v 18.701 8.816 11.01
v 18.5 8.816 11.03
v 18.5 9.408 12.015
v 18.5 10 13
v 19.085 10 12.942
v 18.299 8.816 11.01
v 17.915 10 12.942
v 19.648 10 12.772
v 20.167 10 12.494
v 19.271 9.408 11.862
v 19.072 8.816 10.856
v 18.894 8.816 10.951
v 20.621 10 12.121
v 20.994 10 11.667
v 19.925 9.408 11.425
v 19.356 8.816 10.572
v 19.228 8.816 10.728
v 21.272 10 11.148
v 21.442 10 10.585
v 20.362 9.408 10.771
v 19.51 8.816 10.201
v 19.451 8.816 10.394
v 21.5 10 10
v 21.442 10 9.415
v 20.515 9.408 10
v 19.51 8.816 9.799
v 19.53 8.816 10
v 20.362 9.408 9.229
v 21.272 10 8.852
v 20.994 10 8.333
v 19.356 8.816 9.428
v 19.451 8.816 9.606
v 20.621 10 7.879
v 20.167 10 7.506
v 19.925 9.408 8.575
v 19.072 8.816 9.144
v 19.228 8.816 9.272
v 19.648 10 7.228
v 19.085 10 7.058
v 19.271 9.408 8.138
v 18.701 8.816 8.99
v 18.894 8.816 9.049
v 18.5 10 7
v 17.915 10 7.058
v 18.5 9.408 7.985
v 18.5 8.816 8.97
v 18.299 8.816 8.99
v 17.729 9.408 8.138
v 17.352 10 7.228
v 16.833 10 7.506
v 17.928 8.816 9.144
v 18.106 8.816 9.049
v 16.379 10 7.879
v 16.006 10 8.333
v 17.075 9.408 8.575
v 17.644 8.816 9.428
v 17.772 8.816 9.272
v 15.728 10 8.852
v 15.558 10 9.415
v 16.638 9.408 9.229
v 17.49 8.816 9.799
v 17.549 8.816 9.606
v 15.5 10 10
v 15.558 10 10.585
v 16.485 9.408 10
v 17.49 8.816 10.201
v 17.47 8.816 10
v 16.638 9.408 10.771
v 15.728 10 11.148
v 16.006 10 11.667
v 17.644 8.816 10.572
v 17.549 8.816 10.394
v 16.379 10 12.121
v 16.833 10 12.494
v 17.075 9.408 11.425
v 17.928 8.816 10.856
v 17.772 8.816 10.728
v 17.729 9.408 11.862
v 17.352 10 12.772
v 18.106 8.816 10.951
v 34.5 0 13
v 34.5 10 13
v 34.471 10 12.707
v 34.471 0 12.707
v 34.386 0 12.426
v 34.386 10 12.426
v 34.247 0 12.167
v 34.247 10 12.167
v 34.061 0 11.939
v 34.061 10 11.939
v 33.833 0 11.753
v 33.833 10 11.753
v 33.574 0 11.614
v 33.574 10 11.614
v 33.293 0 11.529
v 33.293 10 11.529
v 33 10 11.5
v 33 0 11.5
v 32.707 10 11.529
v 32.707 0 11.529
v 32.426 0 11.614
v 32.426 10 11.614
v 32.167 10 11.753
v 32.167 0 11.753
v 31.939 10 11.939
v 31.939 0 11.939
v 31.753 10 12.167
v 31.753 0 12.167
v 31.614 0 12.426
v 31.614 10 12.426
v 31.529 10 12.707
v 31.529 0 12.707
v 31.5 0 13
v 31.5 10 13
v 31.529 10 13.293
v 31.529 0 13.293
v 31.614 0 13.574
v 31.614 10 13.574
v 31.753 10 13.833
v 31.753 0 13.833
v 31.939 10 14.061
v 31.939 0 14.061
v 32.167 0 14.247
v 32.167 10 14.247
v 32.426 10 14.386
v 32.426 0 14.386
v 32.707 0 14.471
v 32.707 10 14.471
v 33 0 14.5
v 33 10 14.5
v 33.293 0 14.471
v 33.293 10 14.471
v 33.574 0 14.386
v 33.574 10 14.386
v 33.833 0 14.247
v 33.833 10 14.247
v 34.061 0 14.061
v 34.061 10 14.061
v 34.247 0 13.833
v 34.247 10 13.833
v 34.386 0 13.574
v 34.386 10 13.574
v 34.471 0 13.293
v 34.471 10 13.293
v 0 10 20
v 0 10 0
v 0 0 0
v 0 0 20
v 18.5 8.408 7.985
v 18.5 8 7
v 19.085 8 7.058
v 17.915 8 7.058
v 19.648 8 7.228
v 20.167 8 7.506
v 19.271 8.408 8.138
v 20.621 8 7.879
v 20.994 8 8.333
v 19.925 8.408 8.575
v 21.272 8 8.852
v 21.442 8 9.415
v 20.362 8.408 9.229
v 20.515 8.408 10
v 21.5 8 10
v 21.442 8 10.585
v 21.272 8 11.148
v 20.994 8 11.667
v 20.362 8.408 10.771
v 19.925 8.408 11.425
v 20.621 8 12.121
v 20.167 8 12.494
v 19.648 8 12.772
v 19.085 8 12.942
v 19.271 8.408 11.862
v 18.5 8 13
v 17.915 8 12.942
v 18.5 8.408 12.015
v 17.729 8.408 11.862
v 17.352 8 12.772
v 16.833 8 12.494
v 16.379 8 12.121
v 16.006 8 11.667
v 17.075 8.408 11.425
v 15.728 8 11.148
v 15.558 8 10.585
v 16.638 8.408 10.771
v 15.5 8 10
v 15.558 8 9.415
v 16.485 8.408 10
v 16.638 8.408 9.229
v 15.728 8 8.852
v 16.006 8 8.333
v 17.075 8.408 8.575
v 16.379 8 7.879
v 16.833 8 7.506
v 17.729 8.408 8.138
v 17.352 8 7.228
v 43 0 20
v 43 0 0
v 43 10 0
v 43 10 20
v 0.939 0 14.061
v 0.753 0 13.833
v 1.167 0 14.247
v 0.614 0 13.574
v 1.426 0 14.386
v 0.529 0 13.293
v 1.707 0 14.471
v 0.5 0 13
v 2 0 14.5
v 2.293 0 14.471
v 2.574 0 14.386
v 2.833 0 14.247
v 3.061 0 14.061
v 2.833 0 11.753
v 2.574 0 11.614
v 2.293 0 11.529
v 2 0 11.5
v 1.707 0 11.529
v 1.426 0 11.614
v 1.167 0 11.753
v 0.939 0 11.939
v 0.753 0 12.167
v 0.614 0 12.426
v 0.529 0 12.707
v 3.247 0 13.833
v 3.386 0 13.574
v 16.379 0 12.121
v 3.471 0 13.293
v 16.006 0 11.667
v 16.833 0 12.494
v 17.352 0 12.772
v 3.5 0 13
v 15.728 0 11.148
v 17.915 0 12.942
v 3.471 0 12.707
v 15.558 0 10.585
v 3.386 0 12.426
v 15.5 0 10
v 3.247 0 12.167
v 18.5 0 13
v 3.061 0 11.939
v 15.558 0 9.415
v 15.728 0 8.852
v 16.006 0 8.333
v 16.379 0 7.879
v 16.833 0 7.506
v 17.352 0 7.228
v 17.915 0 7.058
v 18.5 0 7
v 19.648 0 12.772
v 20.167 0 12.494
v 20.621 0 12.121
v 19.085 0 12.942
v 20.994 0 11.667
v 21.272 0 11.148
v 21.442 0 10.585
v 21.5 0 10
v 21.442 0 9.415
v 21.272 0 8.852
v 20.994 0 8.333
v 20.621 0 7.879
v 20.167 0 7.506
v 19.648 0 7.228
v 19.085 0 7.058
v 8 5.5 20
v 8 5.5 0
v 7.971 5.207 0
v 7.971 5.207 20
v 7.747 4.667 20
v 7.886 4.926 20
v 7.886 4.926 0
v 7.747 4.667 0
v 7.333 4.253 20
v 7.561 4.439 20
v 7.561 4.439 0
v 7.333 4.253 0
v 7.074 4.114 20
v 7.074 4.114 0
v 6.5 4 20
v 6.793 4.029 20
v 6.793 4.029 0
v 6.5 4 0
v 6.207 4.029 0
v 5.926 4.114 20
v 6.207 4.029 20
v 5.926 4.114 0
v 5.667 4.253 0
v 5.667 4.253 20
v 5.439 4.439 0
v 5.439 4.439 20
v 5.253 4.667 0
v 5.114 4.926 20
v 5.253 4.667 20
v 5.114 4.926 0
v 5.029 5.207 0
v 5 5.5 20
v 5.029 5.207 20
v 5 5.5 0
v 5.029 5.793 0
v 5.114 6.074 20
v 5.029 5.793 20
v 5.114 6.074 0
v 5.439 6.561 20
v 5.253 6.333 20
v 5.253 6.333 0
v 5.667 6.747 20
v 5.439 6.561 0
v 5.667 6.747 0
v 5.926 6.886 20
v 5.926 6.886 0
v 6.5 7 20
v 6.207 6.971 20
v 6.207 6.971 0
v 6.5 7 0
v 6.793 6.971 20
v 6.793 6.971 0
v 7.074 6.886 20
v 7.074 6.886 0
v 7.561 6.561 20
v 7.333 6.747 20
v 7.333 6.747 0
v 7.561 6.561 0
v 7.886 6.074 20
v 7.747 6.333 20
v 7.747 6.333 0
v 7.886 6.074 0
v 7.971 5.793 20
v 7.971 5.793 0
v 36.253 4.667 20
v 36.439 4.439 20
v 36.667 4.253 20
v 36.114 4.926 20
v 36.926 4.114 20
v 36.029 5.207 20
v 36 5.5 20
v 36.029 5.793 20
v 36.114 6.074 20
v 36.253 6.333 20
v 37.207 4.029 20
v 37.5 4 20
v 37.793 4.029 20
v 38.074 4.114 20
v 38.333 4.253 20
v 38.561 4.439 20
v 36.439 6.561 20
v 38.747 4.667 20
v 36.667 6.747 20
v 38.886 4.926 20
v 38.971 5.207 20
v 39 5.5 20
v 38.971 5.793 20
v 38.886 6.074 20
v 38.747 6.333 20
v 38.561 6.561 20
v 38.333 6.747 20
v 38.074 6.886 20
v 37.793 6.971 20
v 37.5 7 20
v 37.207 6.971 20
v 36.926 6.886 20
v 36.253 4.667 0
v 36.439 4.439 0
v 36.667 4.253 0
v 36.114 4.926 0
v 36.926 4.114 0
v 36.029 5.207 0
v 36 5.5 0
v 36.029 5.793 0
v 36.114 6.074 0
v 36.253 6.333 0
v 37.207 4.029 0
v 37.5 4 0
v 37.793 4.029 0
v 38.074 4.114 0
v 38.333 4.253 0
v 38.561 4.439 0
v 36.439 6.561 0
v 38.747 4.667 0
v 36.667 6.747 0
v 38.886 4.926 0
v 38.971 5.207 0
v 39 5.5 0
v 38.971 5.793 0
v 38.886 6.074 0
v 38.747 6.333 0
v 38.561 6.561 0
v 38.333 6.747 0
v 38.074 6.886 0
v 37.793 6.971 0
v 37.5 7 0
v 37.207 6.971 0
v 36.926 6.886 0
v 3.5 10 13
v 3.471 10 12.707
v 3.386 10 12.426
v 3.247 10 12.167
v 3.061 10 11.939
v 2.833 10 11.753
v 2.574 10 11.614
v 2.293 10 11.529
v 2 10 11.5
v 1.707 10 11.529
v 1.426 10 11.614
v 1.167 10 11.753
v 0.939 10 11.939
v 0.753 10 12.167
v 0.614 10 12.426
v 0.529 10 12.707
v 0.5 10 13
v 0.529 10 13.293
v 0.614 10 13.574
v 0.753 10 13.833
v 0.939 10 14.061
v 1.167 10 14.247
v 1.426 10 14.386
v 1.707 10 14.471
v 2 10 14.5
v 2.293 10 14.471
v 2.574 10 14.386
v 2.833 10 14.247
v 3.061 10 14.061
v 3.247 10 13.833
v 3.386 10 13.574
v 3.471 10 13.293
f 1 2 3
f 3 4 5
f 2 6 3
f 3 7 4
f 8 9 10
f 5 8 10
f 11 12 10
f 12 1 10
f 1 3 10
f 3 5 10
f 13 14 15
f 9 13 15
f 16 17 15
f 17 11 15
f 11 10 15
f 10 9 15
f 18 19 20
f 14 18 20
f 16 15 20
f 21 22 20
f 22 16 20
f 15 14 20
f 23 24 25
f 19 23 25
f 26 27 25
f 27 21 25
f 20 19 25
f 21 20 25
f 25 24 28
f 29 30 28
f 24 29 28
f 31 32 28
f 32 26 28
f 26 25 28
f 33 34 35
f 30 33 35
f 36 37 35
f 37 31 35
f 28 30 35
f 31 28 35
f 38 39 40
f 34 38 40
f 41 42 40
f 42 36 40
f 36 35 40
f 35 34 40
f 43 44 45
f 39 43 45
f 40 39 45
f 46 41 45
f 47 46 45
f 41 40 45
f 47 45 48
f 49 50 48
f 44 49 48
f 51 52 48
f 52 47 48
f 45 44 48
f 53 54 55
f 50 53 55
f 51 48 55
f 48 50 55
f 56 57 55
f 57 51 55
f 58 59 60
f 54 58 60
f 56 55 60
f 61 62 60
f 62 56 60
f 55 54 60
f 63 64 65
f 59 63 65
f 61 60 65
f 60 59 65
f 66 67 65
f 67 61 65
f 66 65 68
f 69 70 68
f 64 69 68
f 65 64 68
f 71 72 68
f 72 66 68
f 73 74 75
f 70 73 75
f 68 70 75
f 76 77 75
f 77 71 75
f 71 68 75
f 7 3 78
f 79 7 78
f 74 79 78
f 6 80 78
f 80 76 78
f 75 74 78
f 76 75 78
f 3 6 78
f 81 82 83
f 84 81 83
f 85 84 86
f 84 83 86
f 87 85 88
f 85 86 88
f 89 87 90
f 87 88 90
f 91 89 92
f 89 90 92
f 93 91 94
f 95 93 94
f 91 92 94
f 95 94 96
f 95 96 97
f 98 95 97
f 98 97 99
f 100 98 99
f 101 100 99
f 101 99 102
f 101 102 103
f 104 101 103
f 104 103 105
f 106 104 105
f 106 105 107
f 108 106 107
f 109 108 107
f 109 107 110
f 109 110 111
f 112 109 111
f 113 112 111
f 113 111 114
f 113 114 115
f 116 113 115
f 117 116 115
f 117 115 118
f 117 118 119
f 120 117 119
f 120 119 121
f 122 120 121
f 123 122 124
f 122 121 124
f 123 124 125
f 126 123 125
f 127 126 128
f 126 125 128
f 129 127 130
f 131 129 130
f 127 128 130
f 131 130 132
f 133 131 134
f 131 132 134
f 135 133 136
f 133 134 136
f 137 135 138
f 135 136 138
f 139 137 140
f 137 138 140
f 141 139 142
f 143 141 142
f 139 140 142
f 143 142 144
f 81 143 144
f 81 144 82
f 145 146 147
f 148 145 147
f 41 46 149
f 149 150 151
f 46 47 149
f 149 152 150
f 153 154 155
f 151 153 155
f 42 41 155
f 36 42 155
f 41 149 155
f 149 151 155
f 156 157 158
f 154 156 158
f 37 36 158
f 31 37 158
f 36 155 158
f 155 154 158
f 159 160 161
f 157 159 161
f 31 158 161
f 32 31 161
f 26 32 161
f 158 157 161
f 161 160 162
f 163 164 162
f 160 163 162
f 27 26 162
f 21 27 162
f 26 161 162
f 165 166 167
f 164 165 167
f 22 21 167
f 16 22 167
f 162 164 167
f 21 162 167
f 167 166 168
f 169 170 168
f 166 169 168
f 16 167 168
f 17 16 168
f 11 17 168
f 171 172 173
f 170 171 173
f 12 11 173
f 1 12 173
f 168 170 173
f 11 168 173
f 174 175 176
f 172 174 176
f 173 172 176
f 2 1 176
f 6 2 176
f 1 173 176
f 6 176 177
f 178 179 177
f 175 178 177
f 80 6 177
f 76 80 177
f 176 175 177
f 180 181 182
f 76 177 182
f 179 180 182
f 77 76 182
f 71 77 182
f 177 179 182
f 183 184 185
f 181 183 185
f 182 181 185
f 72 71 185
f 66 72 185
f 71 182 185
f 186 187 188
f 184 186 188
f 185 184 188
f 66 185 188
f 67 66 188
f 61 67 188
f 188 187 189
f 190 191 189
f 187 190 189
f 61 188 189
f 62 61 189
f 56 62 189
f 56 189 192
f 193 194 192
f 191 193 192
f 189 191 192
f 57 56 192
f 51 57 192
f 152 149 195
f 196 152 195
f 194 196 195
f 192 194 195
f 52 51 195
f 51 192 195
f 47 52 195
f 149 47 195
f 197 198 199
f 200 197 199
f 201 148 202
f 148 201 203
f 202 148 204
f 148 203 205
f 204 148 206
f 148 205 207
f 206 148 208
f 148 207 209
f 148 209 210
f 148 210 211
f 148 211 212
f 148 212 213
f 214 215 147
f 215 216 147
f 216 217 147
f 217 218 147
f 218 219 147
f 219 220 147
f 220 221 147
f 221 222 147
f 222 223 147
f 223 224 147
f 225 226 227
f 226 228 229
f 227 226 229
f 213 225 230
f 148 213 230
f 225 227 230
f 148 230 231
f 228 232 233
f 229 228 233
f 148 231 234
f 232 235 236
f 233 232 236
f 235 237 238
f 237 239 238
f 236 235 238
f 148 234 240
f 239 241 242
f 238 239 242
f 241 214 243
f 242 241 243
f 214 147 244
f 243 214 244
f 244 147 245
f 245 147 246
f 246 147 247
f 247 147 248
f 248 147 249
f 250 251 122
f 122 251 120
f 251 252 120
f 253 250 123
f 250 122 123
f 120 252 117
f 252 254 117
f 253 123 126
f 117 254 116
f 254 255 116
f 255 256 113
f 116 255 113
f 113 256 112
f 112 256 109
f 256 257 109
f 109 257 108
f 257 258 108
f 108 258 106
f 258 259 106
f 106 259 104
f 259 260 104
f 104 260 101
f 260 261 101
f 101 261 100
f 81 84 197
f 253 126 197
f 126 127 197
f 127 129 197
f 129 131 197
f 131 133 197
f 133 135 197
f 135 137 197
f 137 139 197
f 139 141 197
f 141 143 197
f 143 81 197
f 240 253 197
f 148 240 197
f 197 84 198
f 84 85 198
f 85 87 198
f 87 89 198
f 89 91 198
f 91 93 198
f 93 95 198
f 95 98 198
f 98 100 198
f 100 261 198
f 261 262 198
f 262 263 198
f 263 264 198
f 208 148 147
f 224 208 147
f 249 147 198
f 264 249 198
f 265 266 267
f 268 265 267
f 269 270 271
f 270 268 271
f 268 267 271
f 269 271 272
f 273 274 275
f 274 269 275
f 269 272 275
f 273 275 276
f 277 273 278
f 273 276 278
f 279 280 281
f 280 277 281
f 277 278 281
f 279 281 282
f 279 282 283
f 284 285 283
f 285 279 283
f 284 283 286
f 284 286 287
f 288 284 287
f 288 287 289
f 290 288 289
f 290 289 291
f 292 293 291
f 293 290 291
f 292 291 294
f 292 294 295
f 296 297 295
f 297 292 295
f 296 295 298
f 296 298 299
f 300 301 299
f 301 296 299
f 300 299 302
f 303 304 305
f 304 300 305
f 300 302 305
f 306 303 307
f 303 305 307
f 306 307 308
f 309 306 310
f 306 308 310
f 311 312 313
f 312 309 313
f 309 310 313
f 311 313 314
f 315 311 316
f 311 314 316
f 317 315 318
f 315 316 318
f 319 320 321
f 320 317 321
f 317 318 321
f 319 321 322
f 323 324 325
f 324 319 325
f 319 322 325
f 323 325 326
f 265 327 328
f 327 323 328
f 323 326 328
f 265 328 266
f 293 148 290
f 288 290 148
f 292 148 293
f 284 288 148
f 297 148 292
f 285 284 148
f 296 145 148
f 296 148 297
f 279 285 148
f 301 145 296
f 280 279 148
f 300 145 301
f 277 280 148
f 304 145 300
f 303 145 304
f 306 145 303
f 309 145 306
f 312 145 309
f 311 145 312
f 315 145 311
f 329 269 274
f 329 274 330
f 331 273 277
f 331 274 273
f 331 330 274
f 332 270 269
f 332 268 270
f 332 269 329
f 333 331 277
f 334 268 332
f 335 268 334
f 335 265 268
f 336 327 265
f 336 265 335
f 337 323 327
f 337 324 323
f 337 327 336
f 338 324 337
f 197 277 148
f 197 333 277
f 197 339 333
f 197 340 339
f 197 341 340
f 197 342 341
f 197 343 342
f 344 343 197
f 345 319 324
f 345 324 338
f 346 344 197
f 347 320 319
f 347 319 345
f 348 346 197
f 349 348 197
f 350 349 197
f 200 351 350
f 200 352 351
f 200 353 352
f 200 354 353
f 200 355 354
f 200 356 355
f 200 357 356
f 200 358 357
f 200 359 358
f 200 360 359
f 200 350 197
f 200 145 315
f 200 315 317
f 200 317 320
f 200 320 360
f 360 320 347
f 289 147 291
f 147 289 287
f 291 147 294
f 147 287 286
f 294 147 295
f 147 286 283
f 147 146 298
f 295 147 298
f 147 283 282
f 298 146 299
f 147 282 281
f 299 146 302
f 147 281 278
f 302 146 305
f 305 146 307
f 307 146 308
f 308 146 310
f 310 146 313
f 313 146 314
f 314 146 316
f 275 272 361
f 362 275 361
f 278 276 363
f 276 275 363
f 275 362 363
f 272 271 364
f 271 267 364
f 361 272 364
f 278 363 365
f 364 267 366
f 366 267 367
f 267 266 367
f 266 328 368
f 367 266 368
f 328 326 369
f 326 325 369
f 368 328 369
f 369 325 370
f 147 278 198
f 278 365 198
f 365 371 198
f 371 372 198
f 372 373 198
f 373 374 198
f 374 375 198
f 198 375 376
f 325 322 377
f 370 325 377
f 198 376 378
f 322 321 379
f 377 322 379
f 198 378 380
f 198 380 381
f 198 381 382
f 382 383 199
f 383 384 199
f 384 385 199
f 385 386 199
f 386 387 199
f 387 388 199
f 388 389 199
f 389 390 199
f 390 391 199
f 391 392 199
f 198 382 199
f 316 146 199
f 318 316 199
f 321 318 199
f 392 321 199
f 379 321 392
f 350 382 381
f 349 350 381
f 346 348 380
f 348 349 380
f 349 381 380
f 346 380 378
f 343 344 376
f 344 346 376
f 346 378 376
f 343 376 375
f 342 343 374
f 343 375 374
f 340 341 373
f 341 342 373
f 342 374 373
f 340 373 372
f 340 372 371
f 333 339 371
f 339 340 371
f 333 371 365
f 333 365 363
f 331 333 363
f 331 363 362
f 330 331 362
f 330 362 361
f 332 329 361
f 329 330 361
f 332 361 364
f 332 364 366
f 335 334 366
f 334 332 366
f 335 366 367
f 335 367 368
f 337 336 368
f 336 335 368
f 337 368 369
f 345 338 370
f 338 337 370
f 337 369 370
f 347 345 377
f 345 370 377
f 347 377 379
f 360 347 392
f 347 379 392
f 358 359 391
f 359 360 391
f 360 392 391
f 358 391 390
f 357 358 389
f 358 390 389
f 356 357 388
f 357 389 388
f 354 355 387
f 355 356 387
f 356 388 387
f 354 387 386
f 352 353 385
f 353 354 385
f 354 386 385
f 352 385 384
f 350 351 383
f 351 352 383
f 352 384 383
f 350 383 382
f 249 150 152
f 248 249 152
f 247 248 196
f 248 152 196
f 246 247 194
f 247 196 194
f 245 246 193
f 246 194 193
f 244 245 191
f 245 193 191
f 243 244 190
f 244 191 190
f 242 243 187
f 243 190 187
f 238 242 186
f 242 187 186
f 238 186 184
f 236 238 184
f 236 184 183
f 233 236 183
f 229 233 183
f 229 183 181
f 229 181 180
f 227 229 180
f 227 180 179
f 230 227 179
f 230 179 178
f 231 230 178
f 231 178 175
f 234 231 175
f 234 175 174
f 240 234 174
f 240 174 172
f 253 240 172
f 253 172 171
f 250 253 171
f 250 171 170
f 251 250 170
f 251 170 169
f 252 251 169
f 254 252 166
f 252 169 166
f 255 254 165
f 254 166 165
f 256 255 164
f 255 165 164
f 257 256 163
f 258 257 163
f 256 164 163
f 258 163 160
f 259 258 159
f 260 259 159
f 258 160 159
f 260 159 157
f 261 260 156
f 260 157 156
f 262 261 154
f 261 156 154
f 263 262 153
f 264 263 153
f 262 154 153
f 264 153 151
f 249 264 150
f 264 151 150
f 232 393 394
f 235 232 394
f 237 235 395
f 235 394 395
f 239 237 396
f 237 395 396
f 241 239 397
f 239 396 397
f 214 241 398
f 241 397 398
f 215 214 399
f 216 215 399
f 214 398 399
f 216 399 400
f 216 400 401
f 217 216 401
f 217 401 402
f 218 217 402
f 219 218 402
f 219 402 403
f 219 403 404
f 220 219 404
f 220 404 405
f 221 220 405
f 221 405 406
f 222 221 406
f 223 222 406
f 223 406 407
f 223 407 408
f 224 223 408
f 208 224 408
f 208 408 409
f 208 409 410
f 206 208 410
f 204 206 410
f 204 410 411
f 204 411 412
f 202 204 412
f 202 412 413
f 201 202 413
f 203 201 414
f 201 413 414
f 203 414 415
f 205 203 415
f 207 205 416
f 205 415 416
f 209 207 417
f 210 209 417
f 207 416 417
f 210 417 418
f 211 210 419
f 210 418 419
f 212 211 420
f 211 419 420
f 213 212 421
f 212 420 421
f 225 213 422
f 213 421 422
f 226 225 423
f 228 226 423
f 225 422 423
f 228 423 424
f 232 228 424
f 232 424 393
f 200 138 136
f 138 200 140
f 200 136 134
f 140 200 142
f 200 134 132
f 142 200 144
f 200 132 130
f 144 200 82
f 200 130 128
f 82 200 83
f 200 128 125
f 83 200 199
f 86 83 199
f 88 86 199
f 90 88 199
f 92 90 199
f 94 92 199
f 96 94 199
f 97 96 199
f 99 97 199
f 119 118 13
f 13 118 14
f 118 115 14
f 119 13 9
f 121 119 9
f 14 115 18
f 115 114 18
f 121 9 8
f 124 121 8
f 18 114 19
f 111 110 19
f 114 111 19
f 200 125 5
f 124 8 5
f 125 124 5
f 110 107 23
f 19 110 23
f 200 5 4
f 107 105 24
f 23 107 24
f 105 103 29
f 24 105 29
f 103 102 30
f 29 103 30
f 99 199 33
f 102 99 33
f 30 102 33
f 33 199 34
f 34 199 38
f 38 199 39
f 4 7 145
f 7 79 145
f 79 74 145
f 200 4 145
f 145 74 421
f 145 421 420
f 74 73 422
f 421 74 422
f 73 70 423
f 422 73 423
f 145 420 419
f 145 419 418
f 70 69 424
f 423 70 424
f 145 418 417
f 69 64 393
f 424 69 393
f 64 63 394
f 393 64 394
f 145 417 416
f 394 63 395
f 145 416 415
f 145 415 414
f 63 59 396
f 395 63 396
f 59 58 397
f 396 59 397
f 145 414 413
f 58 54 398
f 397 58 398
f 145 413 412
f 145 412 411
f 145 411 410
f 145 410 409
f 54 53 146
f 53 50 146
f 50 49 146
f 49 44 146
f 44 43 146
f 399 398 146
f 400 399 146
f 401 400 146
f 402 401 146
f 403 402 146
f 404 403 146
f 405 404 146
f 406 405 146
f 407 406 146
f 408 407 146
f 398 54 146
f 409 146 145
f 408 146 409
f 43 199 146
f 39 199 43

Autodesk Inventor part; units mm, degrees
ref_plane "YZ Plane" through (0, 0, 0) normal (1, 0, 0) x (0, 1, 0)
ref_plane "XZ Plane" through (0, 0, 0) normal (0, 1, 0) x (-1, 0, 0)
ref_plane "XY Plane" through (0, 0, 0) normal (0, 0, 1) x (1, 0, 0)
sketch "Sketch1" plane through (0, 0, 0) normal (0, 0, 1) x (1, 0, 0)
  line L0 (0, 0) -> (43, 0)
  line L1 (43, 0) -> (43, 10)
  line L2 (43, 10) -> (0, 10)
  line L3 (0, 10) -> (0, 0)
  circle A0 centre (6.5, 5.5) radius 1.5
  circle A1 centre (37.5, 5.5) radius 1.5
  dimension "d0" = 43
  dimension "d1" = 10
  dimension "d2" = 3
  dimension "d3" = 3
  dimension "d4" = 6.5
  dimension "d5" = 31
  dimension "d6" = 4.5
extrude "Extrusion1" add sketch "Sketch1" along normal blind 20
sketch "Sketch2" plane through (0, 10, 0) normal (0, 1, 0) x (1, 0, 0)
  line L0 (0, 0) -> (0, -20) projected
  line L1 (43, -20) -> (0, -20) projected
  circle A0 centre (2, -13) radius 1.5
  circle A1 centre (33, -13) radius 1.5
  dimension "d9" = 7
  dimension "d10" = 2
  dimension "d11" = 3
  dimension "d12" = 3
  dimension "d13" = 31
extrude "Extrusion2" cut sketch "Sketch2" against normal blind 20
sketch "Sketch3" plane through (0, 10, 0) normal (0, 1, 0) x (1, 0, 0)
  line L0 (0, 0) -> (0, -20) projected
  line L1 (43, -20) -> (0, -20) projected
  circle A0 centre (18.5, -10) radius 3
  dimension "d16" = 6
  dimension "d18" = 10
  dimension "d19" = 18.5
hole "Hole1" at (18.5, 10, 10) direction (0, -1, 0) diameter 6 depth 0.0001 tip angle 118
sketch "Sketch4" plane through (0, 0, 0) normal (0, -1, 0) x (1, 0, 0)
  line L0 (0, 20) -> (43, 20) projected
  line L1 (0, 0) -> (0, 20) projected
  circle A0 centre (18.5, 10) radius 2.2122
  dimension "d27" = 10
  dimension "d28" = 18.5
hole "Hole2" at (18.5, 0, 10) direction (0, 1, 0) diameter 6 depth 8 tip angle 135
thread "Thread1" size "M6x1" class "6H" standard "ANSI Metric M Profile" full length
properties part number "heAluBase"
